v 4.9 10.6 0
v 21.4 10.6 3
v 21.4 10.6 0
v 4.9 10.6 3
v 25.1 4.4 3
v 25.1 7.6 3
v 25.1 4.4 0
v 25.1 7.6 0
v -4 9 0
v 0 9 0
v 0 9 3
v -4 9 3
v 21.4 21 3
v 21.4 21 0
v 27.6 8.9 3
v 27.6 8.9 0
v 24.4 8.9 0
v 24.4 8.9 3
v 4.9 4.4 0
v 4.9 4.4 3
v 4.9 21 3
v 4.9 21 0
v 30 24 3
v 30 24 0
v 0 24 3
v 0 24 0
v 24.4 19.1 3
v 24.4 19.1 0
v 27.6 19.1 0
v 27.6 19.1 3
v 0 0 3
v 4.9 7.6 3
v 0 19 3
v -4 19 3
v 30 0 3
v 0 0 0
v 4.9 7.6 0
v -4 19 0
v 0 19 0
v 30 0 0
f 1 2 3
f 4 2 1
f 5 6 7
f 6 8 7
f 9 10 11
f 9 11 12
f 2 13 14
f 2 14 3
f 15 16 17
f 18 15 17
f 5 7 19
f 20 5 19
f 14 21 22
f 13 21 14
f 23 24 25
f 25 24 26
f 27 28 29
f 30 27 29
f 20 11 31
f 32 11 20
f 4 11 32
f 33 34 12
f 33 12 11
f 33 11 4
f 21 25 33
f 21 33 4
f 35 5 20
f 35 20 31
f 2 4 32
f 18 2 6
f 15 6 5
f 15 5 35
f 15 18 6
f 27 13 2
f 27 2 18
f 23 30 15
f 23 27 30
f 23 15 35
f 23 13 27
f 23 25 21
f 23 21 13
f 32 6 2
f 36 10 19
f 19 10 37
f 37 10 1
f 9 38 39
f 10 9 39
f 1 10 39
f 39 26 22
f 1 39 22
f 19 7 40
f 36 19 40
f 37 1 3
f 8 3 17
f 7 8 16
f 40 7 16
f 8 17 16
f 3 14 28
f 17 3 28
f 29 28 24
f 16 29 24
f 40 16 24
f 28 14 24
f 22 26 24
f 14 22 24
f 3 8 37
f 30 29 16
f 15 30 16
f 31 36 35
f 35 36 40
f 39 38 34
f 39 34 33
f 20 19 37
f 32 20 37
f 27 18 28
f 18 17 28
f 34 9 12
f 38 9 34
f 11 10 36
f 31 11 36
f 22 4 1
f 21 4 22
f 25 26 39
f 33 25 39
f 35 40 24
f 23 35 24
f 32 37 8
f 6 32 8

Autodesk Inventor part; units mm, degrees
ref_plane "YZ Plane" through (0, 0, 0) normal (1, 0, 0) x (0, 1, 0)
ref_plane "XZ Plane" through (0, 0, 0) normal (0, 1, 0) x (-1, 0, 0)
ref_plane "XY Plane" through (0, 0, 0) normal (0, 0, 1) x (1, 0, 0)
sketch "Sketch1" plane through (0, 0, 0) normal (0, 0, 1) x (1, 0, 0)
  line L0 (0, 9) -> (-4, 9)
  line L1 (-4, 9) -> (-4, 19)
  line L2 (-4, 19) -> (0, 19)
  line L3 (0, 19) -> (0, 9)
  line L4 (0, 9) -> (0, 0)
  line L5 (0, 0) -> (30, 0)
  line L6 (30, 0) -> (30, 24)
  line L7 (30, 24) -> (0, 24)
  line L8 (0, 24) -> (0, 19)
  line L9 (4.9, 7.6) -> (25.1, 7.6)
  line L10 (25.1, 7.6) -> (25.1, 4.4)
  line L11 (25.1, 4.4) -> (4.9, 4.4)
  line L12 (4.9, 4.4) -> (4.9, 7.6)
  line L13 (4.9, 7.6) -> (25.1, 4.4) construction
  line L14 (25.1, 7.6) -> (4.9, 4.4) construction
  line L15 (24.4, 19.1) -> (27.6, 19.1)
  line L16 (27.6, 19.1) -> (27.6, 8.9)
  line L17 (27.6, 8.9) -> (24.4, 8.9)
  line L18 (24.4, 8.9) -> (24.4, 19.1)
  line L19 (24.4, 19.1) -> (27.6, 8.9) construction
  line L20 (27.6, 19.1) -> (24.4, 8.9) construction
  line L21 (34, 19) -> (30, 19)
  line L22 (30, 19) -> (30, 9)
  line L23 (30, 9) -> (34, 9)
  line L24 (34, 9) -> (34, 19)
  line L25 (34, 19) -> (30, 9) construction
  line L26 (30, 19) -> (34, 9) construction
  point P0 (15, 6)
  point P1 (15, 0)
  point P2 (26, 14)
  point P3 (0, 14)
  point P4 (32, 14)
  dimension "d0" = 10
  dimension "d1" = 4
  dimension "d4" = 30
  dimension "d5" = 20.2
  dimension "d6" = 3.2
  dimension "d8" = 6
  dimension "d11" = 3.2
  dimension "d12" = 4
  dimension "d13" = 10.2
  dimension "d20" = 4
  dimension "d21" = 24
  dimension "d22" = 9
extrude "Extrusion1" add sketch "Sketch1" along normal blind 3 contours L0 L1 L2 L3 | L3 L8 L7 L6 L5 L4
sketch "Sketch2" plane through (0, 0, 3) normal (0, 0, 1) x (1, 0, 0)
  line L0 (4.9, 21) -> (21.4, 21)
  line L1 (21.4, 21) -> (21.4, 10.6)
  line L2 (21.4, 10.6) -> (4.9, 10.6)
  line L3 (4.9, 10.6) -> (4.9, 21)
  line L4 (24.4, 8.9) -> (24.4, 19.1) projected
  line L5 (4.9, 7.6) -> (25.1, 7.6) projected
  line L6 (30, 24) -> (0, 24) projected
  line L7 (0, 9) -> (0, 0) projected
  dimension "d14" = 3
  dimension "d15" = 3
  dimension "d16" = 3
extrude "Extrusion2" cut sketch "Sketch2" against normal blind 3
properties part number "Battary_holder"
